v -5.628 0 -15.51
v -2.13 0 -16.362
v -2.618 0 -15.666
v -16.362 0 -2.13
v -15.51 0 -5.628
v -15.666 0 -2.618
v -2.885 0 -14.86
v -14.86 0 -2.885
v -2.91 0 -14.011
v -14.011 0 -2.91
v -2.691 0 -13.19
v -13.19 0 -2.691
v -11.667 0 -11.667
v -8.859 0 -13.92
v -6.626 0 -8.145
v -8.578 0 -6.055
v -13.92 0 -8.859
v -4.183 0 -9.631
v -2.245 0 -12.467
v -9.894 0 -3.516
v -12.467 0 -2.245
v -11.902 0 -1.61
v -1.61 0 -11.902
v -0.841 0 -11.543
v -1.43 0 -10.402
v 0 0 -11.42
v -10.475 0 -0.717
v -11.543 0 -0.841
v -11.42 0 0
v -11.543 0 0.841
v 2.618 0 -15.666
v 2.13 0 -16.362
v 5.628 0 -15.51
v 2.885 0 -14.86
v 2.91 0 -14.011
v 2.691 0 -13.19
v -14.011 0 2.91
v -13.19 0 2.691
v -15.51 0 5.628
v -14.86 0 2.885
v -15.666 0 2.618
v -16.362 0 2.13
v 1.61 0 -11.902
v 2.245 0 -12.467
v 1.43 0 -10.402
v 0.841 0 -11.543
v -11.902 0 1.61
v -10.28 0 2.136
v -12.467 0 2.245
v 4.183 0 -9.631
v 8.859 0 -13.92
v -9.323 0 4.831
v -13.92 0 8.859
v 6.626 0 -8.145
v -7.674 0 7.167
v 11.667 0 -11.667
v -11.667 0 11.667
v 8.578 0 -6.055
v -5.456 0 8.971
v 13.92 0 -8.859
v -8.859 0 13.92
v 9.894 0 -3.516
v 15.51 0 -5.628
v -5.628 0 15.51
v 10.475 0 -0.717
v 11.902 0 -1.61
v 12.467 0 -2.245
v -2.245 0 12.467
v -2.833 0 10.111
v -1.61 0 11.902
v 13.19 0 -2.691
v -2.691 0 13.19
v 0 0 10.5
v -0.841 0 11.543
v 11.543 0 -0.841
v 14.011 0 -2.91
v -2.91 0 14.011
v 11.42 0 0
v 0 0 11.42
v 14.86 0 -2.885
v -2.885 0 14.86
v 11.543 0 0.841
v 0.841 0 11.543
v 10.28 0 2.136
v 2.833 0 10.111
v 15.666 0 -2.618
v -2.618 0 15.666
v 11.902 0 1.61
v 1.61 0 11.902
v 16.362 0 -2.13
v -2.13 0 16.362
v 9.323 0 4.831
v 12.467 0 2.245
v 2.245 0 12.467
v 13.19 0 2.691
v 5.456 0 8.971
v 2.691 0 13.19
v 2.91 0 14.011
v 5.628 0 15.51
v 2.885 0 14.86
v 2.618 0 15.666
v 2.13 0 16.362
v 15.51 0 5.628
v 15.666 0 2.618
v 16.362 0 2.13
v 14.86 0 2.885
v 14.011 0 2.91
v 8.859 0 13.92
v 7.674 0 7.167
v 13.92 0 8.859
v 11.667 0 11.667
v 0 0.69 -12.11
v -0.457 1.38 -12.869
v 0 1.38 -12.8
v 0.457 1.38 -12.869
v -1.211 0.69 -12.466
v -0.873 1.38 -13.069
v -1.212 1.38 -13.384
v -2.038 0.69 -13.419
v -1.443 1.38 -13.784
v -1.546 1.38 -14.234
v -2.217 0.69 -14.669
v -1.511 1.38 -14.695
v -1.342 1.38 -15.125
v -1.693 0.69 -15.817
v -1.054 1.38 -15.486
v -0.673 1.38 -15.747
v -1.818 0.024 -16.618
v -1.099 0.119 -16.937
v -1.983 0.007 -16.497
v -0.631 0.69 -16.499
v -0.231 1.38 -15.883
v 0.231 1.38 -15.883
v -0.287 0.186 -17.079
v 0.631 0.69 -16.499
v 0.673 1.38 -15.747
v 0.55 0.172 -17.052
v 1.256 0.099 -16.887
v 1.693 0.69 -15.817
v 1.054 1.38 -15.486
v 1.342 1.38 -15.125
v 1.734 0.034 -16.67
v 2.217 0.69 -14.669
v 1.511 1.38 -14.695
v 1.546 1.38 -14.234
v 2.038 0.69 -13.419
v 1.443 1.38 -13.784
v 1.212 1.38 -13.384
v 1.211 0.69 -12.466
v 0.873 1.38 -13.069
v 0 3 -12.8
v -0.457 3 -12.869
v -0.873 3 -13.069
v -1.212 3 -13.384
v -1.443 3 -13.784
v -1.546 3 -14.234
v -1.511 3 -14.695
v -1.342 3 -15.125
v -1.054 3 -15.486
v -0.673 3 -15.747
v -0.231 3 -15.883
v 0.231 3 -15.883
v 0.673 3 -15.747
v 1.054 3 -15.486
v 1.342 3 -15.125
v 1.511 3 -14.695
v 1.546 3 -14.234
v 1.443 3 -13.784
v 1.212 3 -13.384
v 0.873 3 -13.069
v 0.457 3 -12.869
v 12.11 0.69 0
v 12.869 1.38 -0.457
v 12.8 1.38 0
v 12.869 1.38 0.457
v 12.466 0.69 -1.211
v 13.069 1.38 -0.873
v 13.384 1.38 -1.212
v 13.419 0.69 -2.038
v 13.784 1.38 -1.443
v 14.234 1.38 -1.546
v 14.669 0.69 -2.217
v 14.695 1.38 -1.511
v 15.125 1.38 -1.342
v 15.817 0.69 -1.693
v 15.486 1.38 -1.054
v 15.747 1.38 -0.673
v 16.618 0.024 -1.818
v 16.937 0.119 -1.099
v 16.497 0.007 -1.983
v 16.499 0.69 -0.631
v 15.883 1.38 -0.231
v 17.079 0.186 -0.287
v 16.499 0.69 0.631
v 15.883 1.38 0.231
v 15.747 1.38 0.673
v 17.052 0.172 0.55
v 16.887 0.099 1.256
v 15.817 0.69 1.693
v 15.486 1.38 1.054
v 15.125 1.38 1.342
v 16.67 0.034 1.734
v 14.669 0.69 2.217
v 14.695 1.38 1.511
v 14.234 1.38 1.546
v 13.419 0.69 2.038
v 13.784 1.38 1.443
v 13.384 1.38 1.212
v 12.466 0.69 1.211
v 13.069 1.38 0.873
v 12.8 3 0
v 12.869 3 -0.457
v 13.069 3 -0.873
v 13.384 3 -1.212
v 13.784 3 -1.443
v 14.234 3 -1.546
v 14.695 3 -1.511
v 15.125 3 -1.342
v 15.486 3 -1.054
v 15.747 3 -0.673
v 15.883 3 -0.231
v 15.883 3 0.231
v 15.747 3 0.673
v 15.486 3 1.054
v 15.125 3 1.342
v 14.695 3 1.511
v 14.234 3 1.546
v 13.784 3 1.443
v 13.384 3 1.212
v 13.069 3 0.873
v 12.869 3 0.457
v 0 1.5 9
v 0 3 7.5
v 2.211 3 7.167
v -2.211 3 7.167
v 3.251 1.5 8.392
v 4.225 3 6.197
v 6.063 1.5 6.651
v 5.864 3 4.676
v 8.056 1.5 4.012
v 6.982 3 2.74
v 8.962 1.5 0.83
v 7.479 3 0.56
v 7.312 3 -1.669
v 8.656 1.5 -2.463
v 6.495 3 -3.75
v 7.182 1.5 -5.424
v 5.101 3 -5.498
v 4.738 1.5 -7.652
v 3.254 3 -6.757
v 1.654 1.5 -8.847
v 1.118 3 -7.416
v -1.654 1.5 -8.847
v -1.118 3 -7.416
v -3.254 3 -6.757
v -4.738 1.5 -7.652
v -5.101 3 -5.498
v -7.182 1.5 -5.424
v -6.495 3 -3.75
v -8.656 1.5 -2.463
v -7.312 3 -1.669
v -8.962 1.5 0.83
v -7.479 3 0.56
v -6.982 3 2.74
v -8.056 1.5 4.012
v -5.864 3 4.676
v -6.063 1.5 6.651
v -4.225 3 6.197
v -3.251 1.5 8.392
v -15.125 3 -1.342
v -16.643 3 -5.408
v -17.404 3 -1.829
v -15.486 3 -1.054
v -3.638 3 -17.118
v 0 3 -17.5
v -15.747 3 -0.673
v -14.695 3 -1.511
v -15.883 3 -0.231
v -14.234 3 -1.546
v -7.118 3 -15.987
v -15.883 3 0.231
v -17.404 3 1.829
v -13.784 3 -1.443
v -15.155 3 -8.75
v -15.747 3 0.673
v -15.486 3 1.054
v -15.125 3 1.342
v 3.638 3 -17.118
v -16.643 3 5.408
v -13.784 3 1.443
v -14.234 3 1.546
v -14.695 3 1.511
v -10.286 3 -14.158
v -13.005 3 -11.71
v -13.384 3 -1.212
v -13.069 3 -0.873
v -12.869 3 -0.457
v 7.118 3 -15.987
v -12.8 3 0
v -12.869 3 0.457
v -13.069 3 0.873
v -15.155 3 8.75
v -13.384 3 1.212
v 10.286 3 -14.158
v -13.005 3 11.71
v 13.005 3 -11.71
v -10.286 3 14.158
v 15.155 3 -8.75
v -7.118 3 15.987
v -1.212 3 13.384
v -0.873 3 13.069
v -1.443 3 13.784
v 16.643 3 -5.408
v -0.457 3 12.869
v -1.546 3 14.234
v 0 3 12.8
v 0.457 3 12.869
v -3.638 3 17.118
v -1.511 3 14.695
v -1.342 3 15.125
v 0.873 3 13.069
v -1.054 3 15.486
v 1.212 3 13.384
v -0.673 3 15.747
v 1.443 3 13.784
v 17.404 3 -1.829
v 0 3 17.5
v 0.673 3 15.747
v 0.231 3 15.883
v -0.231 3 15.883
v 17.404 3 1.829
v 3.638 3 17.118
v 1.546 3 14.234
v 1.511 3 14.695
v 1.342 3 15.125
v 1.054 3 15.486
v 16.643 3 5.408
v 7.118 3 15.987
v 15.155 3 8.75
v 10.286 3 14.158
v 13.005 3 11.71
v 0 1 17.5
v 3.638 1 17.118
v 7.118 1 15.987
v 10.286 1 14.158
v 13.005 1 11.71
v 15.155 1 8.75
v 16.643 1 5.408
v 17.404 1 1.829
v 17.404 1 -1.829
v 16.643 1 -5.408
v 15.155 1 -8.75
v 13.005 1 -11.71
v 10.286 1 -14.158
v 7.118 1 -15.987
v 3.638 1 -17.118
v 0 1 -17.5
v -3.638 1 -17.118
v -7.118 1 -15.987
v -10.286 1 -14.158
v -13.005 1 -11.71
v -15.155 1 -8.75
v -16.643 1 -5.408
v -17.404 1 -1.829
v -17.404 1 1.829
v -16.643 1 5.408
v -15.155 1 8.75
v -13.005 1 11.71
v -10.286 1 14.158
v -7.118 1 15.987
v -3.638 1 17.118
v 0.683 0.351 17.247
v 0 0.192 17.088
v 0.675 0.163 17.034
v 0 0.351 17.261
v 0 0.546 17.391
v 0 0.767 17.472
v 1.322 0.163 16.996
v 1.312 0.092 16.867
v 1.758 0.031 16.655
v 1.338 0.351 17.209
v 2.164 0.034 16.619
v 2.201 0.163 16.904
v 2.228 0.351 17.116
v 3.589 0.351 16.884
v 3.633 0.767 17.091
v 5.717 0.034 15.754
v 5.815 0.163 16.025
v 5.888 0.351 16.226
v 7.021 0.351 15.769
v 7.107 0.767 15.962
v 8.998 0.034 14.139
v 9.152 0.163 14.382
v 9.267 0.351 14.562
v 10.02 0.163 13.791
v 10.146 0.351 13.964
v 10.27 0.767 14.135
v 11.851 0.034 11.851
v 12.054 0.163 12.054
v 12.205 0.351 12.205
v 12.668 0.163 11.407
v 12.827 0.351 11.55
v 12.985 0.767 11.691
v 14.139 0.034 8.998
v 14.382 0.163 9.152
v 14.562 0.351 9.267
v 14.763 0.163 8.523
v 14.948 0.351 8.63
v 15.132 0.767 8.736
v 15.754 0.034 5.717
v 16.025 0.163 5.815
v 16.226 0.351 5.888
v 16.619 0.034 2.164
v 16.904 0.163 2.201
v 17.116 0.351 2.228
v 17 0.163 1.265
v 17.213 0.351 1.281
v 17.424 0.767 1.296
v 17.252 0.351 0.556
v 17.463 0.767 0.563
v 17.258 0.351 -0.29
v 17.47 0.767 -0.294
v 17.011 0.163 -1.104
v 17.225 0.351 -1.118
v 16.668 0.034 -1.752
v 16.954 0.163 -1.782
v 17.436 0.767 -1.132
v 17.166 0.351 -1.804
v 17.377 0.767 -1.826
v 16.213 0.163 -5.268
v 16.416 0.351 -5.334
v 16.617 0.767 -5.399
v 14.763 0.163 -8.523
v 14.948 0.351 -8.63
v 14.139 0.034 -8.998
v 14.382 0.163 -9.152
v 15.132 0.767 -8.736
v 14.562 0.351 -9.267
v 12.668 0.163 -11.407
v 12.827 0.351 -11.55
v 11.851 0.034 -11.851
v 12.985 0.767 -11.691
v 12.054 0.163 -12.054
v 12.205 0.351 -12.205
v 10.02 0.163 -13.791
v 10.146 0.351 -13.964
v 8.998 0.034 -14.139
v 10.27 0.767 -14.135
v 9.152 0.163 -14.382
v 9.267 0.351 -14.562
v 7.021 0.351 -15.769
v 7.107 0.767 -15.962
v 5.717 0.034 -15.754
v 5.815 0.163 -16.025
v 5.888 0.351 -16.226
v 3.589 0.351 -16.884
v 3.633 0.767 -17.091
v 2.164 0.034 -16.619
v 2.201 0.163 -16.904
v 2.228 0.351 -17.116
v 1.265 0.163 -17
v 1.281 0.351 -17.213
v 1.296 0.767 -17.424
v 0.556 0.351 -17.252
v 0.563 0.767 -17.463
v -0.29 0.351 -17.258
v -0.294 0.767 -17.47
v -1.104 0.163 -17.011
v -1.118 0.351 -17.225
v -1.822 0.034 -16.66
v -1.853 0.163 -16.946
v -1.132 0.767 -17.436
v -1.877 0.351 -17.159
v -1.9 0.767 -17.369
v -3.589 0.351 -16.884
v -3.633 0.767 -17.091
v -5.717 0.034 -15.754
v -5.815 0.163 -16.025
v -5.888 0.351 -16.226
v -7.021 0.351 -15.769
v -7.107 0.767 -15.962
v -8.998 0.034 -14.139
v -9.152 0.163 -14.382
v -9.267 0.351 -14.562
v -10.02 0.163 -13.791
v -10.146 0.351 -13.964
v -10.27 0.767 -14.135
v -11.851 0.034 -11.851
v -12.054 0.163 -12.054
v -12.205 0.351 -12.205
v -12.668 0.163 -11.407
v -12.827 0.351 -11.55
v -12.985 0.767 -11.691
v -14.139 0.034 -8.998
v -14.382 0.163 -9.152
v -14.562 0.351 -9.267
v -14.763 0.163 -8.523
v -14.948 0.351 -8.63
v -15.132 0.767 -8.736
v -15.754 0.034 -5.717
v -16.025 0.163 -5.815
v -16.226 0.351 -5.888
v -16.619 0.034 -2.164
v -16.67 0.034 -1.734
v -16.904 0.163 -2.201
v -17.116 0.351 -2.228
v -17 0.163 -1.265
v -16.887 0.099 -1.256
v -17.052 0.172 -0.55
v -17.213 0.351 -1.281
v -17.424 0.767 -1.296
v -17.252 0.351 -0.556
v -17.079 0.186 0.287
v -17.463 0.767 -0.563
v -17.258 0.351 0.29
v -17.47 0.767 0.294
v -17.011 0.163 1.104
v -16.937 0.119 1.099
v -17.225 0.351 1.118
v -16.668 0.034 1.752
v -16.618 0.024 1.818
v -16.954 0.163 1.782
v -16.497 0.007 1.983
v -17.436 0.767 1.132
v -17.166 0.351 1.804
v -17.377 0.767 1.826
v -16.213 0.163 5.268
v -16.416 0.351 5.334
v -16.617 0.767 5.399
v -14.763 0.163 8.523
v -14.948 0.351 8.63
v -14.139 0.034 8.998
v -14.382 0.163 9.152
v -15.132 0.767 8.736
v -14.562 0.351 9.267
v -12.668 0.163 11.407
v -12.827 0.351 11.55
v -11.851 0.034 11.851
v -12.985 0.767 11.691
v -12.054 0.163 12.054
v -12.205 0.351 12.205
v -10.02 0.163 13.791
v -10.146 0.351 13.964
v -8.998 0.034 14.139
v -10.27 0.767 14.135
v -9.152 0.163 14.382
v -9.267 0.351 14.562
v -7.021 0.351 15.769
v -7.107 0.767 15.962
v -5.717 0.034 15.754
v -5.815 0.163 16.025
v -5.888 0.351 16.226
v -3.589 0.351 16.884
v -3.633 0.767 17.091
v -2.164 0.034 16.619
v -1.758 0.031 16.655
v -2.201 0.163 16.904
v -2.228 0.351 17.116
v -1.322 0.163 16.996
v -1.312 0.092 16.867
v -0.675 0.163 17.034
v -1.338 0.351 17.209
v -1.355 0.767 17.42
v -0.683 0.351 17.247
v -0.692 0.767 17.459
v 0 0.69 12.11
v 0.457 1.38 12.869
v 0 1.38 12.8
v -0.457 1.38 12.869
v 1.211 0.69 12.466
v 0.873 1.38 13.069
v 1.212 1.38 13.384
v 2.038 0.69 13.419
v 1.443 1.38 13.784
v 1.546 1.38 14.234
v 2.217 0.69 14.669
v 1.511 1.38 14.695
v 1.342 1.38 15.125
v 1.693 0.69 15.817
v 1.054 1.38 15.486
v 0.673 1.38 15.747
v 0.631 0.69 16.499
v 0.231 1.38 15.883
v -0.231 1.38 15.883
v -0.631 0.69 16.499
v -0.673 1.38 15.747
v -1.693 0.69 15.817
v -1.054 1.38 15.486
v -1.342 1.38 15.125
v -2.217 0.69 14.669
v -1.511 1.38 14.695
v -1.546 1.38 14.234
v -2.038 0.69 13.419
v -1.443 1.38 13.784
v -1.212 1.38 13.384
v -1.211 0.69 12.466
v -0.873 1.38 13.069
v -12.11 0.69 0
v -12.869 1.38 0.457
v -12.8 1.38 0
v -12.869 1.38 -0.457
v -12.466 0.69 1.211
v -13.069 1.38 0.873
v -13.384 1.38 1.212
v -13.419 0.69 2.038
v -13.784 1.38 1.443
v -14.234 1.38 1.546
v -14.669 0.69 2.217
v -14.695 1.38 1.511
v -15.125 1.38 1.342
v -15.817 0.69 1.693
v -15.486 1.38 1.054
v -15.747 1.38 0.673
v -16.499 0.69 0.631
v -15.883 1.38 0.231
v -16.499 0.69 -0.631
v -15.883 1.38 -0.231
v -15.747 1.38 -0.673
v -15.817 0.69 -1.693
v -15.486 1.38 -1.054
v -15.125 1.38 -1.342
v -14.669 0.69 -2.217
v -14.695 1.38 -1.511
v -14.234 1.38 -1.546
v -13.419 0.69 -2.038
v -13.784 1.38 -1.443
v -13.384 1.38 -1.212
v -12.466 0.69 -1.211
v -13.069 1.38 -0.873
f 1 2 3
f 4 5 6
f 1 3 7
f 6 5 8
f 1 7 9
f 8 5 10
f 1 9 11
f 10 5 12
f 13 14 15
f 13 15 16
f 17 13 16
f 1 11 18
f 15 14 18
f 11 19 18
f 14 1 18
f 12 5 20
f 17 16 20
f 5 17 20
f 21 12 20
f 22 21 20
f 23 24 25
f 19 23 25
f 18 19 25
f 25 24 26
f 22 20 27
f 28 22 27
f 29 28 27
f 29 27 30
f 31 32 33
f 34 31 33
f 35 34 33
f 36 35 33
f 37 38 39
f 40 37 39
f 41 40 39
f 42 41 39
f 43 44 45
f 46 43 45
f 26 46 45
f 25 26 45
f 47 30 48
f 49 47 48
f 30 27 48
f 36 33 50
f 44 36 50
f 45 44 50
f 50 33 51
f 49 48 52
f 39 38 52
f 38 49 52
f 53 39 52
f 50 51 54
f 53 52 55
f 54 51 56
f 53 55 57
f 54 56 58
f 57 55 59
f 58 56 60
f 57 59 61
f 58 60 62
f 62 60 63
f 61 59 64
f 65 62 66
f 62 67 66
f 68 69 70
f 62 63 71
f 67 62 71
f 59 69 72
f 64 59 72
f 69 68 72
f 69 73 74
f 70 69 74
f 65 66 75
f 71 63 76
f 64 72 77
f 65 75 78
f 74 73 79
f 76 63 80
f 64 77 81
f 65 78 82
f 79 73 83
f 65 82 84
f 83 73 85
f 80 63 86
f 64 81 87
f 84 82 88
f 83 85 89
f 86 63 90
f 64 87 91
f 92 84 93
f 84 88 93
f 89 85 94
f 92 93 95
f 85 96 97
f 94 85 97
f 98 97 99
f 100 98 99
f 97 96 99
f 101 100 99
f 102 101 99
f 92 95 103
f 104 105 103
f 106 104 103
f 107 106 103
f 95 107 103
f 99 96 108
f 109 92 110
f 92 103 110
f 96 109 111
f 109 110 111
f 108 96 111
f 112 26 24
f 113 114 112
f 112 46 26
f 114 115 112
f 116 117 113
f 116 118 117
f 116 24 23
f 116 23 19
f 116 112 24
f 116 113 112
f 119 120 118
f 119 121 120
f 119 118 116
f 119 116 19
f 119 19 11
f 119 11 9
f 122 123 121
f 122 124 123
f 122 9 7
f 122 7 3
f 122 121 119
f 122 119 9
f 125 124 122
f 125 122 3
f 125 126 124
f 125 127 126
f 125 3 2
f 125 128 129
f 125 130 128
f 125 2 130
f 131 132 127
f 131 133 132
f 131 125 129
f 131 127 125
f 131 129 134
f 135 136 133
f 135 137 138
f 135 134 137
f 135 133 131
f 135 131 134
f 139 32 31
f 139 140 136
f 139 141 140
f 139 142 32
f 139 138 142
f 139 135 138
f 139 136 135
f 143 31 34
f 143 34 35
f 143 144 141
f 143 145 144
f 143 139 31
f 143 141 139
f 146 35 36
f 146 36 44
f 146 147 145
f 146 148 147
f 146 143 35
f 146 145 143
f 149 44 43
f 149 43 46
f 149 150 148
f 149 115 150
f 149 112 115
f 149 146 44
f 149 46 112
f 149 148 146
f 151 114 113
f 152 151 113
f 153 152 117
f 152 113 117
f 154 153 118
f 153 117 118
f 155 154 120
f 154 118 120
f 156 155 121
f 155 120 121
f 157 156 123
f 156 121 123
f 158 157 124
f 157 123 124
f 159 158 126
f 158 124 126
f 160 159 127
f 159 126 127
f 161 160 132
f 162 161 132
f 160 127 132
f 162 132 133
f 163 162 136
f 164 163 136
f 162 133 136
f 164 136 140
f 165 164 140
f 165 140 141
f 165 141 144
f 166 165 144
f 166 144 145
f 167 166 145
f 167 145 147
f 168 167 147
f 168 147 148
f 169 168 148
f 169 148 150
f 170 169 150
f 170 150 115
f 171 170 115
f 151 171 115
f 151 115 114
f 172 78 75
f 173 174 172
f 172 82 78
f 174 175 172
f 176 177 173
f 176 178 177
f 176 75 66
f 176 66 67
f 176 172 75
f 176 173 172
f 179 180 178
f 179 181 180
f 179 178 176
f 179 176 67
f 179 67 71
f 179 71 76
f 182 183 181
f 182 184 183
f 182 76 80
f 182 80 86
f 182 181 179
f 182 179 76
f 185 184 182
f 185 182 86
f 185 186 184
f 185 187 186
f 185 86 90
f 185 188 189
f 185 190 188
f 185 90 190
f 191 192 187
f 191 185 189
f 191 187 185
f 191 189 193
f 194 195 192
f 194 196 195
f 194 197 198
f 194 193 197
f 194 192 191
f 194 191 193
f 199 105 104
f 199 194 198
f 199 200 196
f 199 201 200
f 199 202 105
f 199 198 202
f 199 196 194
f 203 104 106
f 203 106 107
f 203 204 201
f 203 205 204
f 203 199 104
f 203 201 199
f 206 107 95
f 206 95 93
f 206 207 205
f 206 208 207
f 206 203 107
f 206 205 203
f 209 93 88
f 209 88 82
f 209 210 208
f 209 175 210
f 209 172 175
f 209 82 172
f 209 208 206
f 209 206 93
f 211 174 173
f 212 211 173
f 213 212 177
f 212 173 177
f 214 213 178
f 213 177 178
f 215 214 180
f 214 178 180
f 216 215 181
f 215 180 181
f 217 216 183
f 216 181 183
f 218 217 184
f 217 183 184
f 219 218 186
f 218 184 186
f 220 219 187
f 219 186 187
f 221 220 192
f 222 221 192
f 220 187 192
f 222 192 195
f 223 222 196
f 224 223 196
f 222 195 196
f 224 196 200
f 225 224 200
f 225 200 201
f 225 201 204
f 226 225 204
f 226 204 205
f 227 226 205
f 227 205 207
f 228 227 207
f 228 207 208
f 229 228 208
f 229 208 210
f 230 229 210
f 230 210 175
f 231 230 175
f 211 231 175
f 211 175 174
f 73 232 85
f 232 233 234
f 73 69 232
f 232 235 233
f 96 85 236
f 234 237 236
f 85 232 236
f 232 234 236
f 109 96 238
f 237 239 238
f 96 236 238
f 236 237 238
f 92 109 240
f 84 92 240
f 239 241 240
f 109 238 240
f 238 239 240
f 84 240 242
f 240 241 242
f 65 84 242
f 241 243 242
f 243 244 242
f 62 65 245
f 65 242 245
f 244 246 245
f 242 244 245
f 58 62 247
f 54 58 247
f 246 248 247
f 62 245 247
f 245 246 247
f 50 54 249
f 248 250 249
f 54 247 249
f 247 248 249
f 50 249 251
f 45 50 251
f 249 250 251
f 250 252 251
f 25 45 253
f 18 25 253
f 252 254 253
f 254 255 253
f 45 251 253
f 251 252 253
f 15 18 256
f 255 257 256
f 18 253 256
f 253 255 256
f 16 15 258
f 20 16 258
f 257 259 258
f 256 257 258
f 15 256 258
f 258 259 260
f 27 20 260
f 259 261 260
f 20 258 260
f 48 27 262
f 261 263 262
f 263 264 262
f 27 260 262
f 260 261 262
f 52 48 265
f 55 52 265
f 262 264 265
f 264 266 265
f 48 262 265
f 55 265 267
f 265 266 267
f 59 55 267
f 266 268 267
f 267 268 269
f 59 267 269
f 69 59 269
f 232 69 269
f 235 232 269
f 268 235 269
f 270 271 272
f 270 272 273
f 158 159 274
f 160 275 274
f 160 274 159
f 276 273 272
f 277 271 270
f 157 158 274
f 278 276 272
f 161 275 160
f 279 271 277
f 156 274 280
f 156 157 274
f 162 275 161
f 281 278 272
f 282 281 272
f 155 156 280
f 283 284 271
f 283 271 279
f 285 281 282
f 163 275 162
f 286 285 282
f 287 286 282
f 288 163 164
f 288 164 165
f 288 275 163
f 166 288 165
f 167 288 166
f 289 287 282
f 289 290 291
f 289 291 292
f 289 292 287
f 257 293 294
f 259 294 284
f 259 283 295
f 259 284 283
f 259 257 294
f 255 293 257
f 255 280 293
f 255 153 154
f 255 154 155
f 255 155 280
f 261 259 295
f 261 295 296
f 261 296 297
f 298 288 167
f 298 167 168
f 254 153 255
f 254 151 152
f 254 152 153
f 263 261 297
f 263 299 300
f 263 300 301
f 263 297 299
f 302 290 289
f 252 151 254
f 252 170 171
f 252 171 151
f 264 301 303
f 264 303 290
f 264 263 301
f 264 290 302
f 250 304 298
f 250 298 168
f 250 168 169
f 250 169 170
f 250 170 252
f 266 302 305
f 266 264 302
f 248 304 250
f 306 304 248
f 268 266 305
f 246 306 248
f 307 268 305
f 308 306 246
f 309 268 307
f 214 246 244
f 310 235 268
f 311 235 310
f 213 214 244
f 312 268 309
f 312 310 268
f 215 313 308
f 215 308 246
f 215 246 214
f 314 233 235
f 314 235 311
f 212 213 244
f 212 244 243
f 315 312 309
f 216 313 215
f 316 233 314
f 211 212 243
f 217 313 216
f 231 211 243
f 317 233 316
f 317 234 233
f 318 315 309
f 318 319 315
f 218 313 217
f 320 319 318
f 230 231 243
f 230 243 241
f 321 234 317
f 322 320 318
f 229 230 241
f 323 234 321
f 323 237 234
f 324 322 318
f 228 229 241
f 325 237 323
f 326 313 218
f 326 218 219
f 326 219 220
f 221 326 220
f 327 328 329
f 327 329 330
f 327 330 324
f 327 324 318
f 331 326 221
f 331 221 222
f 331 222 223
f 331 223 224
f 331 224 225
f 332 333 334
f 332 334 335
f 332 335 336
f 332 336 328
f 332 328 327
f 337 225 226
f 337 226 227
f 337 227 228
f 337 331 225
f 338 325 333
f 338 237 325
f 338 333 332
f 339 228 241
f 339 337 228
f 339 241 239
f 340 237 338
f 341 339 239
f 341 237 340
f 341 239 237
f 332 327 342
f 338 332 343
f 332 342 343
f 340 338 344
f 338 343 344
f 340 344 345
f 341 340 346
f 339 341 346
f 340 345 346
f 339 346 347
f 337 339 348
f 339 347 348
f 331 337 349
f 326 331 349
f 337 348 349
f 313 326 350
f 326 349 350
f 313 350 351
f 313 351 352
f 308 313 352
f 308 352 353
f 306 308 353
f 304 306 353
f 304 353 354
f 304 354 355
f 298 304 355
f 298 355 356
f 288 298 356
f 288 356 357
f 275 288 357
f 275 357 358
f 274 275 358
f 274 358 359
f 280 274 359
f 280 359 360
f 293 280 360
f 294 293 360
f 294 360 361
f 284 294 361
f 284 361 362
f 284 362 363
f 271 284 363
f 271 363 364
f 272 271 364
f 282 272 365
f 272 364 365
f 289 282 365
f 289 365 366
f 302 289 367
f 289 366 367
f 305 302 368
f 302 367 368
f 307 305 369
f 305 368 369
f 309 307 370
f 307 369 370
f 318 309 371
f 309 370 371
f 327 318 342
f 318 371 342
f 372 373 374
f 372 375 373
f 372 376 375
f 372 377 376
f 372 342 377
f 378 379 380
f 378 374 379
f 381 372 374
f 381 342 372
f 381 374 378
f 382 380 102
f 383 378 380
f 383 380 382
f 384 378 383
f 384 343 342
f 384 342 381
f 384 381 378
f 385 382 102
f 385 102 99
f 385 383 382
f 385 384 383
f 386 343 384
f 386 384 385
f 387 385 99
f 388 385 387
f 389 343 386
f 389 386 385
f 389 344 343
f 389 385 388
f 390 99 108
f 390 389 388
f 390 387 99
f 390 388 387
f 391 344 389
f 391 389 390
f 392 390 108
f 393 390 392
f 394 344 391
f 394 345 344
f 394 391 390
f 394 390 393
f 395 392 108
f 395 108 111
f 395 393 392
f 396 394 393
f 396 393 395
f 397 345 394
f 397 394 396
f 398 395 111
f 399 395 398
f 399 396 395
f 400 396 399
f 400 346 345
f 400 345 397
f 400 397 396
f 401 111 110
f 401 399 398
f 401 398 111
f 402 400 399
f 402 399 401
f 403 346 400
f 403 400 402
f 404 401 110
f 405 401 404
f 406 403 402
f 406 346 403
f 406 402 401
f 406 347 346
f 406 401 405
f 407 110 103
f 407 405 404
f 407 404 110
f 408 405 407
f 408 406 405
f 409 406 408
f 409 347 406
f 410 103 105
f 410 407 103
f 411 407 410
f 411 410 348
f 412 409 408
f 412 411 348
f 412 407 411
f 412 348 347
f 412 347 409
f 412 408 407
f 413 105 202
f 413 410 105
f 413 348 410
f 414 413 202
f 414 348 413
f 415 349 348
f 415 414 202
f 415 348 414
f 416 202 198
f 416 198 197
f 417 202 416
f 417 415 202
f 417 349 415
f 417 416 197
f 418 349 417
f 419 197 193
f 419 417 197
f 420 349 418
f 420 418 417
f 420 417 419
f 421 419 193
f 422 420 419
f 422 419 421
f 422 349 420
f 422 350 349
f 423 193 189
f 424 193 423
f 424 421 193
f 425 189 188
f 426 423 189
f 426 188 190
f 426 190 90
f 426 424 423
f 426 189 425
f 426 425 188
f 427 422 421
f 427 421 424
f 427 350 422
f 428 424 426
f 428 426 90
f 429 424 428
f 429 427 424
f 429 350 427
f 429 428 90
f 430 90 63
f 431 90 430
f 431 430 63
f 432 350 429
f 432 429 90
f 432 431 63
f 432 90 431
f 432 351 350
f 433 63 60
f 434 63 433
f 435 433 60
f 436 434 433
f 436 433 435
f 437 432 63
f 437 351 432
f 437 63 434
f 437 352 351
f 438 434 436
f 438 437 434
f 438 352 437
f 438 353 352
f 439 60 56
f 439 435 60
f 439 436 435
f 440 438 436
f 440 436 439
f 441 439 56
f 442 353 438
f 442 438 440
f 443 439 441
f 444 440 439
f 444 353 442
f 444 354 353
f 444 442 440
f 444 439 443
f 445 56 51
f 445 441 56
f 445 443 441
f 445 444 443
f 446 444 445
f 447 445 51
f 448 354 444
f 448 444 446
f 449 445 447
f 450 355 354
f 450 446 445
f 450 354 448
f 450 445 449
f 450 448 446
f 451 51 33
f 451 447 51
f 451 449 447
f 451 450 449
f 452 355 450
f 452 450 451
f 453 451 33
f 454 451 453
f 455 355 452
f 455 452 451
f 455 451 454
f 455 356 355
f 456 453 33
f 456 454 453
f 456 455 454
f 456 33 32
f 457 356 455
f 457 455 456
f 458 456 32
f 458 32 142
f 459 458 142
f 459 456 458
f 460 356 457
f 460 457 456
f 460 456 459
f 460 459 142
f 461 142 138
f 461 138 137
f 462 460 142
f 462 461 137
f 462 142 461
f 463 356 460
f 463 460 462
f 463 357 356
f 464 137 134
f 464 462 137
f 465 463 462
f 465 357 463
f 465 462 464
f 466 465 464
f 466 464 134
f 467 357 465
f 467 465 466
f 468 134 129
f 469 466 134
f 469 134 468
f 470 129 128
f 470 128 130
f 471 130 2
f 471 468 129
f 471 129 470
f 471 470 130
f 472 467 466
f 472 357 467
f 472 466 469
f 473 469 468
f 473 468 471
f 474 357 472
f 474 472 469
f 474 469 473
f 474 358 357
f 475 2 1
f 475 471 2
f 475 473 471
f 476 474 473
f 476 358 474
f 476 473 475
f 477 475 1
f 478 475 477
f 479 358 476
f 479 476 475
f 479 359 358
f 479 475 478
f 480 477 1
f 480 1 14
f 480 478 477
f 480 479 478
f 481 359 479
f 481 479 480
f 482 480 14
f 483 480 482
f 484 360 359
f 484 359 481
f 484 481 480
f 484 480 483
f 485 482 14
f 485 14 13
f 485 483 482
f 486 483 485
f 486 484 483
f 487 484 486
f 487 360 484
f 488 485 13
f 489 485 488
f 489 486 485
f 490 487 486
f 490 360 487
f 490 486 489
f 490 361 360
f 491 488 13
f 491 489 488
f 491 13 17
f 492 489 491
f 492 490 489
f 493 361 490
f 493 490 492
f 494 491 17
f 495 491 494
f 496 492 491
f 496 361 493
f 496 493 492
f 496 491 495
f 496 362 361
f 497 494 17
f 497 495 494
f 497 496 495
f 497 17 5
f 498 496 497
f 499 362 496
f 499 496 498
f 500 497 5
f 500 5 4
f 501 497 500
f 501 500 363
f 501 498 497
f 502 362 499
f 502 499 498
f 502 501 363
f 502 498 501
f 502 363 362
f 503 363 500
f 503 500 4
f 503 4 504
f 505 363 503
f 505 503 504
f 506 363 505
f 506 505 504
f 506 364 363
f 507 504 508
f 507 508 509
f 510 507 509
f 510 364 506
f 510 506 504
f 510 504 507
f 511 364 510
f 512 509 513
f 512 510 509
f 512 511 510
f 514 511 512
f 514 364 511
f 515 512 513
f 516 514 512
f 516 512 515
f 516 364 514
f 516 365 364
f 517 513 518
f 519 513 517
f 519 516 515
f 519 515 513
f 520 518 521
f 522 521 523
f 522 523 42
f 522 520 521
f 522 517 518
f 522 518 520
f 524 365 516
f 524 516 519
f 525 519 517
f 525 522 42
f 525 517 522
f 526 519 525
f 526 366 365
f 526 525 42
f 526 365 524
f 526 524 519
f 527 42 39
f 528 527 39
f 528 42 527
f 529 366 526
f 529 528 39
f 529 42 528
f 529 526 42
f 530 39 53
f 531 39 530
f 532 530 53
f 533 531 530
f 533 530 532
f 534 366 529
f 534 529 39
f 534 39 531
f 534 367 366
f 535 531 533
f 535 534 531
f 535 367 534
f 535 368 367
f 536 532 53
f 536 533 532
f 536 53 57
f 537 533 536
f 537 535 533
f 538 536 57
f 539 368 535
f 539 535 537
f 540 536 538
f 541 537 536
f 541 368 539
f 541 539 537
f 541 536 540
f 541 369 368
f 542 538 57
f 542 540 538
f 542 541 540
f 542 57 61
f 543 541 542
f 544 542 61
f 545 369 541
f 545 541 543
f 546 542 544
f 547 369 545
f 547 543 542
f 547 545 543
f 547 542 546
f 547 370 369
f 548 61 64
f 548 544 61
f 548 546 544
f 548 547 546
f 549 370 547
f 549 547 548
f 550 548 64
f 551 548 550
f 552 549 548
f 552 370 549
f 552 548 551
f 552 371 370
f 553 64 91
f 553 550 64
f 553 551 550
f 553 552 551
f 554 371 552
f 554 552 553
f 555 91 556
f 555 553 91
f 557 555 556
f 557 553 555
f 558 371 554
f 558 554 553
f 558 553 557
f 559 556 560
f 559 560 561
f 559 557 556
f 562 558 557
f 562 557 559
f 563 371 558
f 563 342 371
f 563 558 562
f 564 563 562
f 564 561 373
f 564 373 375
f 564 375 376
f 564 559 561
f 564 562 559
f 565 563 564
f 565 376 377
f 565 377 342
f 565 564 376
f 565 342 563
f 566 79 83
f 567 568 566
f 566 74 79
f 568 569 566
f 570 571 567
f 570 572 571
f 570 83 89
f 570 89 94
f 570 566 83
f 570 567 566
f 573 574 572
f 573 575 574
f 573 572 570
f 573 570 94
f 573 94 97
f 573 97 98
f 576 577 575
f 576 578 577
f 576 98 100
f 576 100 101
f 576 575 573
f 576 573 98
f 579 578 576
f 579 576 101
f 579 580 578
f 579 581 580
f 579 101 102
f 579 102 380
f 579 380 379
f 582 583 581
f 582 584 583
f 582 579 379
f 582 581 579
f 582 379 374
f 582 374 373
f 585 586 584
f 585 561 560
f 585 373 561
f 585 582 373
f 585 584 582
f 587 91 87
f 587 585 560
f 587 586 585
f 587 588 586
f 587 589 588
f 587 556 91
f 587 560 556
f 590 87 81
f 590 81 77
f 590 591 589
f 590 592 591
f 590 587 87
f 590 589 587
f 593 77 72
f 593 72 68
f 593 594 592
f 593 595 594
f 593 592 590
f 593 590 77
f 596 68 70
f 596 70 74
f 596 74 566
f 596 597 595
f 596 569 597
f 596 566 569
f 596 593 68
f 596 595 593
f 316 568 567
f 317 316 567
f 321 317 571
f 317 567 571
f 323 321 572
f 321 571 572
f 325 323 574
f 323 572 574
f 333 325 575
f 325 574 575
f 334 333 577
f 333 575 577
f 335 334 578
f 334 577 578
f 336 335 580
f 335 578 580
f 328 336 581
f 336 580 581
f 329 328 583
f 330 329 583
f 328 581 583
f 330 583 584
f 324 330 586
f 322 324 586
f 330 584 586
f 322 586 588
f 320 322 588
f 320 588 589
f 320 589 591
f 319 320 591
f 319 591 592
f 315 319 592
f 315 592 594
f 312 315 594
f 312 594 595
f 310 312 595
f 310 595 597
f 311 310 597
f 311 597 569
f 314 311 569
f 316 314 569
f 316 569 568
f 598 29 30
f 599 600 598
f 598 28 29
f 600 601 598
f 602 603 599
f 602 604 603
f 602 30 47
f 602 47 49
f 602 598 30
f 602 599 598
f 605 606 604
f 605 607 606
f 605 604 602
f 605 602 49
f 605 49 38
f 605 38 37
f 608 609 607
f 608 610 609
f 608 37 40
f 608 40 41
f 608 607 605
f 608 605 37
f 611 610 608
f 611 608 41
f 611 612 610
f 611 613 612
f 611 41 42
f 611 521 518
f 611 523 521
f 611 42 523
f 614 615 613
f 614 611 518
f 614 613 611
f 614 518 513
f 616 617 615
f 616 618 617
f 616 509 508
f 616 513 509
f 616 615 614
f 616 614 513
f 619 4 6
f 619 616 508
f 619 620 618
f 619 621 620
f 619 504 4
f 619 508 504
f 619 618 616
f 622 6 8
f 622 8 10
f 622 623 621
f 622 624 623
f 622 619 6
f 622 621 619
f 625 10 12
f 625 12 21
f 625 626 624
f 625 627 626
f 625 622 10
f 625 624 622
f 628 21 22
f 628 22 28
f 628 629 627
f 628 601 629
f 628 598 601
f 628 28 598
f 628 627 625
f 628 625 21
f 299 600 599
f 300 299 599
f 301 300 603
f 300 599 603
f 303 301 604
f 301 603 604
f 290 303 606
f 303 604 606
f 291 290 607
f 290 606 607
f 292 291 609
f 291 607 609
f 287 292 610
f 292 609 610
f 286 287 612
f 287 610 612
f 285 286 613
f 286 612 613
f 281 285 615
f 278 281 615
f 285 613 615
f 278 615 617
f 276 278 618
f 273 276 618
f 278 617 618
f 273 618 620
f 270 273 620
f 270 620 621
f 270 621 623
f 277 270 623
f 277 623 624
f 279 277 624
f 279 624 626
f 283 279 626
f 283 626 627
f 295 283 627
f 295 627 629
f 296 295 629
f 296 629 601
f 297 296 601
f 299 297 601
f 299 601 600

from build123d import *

# Parameters (mm, degrees)
SKETCH1_R                    = 17.5
SKETCH1_R_2                  = 7.5
BOSS_EXTRUDE1_DEPTH          = 3
SKETCH3_R                    = 1.55
CUT_EXTRUDE1_DEPTH           = 5
CHAMFER6_SIZE                = 1.38
CIRPATTERN2_COUNT            = 4
CHAMFER6_OF_CIRPATTERN2_SIZE = 1.38
CHAMFER7_SIZE                = 3
FILLET1_R                    = 1


# Some blends are built 0.0001 mm under size
with BuildPart() as part:
    # Sketch1 → Boss-Extrude1 (new body)
    with BuildSketch(Plane(origin=(0, 0, 0), x_dir=(1, 0, 0), z_dir=(0, 1, 0))):
        with Locations(Location((0, 0, 0), (0, 0, 270))):
            Circle(SKETCH1_R)
        with Locations(Location((0, 0, 0), (0, 0, 270))):
            Circle(SKETCH1_R_2, mode=Mode.SUBTRACT)
    extrude(amount=BOSS_EXTRUDE1_DEPTH)

    # Sketch3 → Cut-Extrude1 (cut)
    with BuildSketch(Plane.XZ):
        with Locations(Location((0, 14.35, 0), (0, 0, 270))):
            Circle(SKETCH3_R)
    cut_extrude1 = extrude(amount=-CUT_EXTRUDE1_DEPTH, mode=Mode.SUBTRACT)

    # Chamfer6
    chamfer6_edges = [part.edges().sort_by_distance(p)[0] for p in [
        (0, 0, 15.9),
    ]]
    chamfer(chamfer6_edges, length=CHAMFER6_SIZE)

    # CirPattern2: Cut-Extrude1 ×4 about axis
    cirpattern2_axis = Axis((0, 0, 0), (0, 1, 0))
    for i in range(1, CIRPATTERN2_COUNT):
        add(cut_extrude1.rotate(cirpattern2_axis, i * 360 / CIRPATTERN2_COUNT), mode=Mode.SUBTRACT)

    # Chamfer6 of CirPattern2
    chamfer6_of_cirpattern2_edges = [part.edges().sort_by_distance(p)[0] for p in [
        (15.9, 0, 0),
        (0, 0, -15.9),
        (-15.9, 0, 0),
    ]]
    chamfer(chamfer6_of_cirpattern2_edges, length=CHAMFER6_OF_CIRPATTERN2_SIZE)

    # Chamfer7
    chamfer7_edges = [part.edges().sort_by_distance(p)[0] for p in [
        (0, 0, -7.5),
    ]]
    chamfer(chamfer7_edges, length=CHAMFER7_SIZE - 0.0001)  # a hair under: the kernel refuses the full size

    # Fillet1
    # the kernel refuses this fillet: 1 mm, written as the material it takes off along each edge
    with BuildSketch(Plane(origin=(0, 0, 0), x_dir=(0, 0, 1), z_dir=(-1, 0, 0))) as fillet1_piece_1:
        with BuildLine():
            CenterArc((17.5 - FILLET1_R, FILLET1_R), FILLET1_R, 270, 90)
            Line((17.5, FILLET1_R), (17.5, 0))
            Line((17.5, 0), (17.5 - FILLET1_R, 0))
        make_face()
    revolve(axis=Axis((0, 0, 0), (0, 1, 0)), mode=Mode.SUBTRACT)


solid = part.part
